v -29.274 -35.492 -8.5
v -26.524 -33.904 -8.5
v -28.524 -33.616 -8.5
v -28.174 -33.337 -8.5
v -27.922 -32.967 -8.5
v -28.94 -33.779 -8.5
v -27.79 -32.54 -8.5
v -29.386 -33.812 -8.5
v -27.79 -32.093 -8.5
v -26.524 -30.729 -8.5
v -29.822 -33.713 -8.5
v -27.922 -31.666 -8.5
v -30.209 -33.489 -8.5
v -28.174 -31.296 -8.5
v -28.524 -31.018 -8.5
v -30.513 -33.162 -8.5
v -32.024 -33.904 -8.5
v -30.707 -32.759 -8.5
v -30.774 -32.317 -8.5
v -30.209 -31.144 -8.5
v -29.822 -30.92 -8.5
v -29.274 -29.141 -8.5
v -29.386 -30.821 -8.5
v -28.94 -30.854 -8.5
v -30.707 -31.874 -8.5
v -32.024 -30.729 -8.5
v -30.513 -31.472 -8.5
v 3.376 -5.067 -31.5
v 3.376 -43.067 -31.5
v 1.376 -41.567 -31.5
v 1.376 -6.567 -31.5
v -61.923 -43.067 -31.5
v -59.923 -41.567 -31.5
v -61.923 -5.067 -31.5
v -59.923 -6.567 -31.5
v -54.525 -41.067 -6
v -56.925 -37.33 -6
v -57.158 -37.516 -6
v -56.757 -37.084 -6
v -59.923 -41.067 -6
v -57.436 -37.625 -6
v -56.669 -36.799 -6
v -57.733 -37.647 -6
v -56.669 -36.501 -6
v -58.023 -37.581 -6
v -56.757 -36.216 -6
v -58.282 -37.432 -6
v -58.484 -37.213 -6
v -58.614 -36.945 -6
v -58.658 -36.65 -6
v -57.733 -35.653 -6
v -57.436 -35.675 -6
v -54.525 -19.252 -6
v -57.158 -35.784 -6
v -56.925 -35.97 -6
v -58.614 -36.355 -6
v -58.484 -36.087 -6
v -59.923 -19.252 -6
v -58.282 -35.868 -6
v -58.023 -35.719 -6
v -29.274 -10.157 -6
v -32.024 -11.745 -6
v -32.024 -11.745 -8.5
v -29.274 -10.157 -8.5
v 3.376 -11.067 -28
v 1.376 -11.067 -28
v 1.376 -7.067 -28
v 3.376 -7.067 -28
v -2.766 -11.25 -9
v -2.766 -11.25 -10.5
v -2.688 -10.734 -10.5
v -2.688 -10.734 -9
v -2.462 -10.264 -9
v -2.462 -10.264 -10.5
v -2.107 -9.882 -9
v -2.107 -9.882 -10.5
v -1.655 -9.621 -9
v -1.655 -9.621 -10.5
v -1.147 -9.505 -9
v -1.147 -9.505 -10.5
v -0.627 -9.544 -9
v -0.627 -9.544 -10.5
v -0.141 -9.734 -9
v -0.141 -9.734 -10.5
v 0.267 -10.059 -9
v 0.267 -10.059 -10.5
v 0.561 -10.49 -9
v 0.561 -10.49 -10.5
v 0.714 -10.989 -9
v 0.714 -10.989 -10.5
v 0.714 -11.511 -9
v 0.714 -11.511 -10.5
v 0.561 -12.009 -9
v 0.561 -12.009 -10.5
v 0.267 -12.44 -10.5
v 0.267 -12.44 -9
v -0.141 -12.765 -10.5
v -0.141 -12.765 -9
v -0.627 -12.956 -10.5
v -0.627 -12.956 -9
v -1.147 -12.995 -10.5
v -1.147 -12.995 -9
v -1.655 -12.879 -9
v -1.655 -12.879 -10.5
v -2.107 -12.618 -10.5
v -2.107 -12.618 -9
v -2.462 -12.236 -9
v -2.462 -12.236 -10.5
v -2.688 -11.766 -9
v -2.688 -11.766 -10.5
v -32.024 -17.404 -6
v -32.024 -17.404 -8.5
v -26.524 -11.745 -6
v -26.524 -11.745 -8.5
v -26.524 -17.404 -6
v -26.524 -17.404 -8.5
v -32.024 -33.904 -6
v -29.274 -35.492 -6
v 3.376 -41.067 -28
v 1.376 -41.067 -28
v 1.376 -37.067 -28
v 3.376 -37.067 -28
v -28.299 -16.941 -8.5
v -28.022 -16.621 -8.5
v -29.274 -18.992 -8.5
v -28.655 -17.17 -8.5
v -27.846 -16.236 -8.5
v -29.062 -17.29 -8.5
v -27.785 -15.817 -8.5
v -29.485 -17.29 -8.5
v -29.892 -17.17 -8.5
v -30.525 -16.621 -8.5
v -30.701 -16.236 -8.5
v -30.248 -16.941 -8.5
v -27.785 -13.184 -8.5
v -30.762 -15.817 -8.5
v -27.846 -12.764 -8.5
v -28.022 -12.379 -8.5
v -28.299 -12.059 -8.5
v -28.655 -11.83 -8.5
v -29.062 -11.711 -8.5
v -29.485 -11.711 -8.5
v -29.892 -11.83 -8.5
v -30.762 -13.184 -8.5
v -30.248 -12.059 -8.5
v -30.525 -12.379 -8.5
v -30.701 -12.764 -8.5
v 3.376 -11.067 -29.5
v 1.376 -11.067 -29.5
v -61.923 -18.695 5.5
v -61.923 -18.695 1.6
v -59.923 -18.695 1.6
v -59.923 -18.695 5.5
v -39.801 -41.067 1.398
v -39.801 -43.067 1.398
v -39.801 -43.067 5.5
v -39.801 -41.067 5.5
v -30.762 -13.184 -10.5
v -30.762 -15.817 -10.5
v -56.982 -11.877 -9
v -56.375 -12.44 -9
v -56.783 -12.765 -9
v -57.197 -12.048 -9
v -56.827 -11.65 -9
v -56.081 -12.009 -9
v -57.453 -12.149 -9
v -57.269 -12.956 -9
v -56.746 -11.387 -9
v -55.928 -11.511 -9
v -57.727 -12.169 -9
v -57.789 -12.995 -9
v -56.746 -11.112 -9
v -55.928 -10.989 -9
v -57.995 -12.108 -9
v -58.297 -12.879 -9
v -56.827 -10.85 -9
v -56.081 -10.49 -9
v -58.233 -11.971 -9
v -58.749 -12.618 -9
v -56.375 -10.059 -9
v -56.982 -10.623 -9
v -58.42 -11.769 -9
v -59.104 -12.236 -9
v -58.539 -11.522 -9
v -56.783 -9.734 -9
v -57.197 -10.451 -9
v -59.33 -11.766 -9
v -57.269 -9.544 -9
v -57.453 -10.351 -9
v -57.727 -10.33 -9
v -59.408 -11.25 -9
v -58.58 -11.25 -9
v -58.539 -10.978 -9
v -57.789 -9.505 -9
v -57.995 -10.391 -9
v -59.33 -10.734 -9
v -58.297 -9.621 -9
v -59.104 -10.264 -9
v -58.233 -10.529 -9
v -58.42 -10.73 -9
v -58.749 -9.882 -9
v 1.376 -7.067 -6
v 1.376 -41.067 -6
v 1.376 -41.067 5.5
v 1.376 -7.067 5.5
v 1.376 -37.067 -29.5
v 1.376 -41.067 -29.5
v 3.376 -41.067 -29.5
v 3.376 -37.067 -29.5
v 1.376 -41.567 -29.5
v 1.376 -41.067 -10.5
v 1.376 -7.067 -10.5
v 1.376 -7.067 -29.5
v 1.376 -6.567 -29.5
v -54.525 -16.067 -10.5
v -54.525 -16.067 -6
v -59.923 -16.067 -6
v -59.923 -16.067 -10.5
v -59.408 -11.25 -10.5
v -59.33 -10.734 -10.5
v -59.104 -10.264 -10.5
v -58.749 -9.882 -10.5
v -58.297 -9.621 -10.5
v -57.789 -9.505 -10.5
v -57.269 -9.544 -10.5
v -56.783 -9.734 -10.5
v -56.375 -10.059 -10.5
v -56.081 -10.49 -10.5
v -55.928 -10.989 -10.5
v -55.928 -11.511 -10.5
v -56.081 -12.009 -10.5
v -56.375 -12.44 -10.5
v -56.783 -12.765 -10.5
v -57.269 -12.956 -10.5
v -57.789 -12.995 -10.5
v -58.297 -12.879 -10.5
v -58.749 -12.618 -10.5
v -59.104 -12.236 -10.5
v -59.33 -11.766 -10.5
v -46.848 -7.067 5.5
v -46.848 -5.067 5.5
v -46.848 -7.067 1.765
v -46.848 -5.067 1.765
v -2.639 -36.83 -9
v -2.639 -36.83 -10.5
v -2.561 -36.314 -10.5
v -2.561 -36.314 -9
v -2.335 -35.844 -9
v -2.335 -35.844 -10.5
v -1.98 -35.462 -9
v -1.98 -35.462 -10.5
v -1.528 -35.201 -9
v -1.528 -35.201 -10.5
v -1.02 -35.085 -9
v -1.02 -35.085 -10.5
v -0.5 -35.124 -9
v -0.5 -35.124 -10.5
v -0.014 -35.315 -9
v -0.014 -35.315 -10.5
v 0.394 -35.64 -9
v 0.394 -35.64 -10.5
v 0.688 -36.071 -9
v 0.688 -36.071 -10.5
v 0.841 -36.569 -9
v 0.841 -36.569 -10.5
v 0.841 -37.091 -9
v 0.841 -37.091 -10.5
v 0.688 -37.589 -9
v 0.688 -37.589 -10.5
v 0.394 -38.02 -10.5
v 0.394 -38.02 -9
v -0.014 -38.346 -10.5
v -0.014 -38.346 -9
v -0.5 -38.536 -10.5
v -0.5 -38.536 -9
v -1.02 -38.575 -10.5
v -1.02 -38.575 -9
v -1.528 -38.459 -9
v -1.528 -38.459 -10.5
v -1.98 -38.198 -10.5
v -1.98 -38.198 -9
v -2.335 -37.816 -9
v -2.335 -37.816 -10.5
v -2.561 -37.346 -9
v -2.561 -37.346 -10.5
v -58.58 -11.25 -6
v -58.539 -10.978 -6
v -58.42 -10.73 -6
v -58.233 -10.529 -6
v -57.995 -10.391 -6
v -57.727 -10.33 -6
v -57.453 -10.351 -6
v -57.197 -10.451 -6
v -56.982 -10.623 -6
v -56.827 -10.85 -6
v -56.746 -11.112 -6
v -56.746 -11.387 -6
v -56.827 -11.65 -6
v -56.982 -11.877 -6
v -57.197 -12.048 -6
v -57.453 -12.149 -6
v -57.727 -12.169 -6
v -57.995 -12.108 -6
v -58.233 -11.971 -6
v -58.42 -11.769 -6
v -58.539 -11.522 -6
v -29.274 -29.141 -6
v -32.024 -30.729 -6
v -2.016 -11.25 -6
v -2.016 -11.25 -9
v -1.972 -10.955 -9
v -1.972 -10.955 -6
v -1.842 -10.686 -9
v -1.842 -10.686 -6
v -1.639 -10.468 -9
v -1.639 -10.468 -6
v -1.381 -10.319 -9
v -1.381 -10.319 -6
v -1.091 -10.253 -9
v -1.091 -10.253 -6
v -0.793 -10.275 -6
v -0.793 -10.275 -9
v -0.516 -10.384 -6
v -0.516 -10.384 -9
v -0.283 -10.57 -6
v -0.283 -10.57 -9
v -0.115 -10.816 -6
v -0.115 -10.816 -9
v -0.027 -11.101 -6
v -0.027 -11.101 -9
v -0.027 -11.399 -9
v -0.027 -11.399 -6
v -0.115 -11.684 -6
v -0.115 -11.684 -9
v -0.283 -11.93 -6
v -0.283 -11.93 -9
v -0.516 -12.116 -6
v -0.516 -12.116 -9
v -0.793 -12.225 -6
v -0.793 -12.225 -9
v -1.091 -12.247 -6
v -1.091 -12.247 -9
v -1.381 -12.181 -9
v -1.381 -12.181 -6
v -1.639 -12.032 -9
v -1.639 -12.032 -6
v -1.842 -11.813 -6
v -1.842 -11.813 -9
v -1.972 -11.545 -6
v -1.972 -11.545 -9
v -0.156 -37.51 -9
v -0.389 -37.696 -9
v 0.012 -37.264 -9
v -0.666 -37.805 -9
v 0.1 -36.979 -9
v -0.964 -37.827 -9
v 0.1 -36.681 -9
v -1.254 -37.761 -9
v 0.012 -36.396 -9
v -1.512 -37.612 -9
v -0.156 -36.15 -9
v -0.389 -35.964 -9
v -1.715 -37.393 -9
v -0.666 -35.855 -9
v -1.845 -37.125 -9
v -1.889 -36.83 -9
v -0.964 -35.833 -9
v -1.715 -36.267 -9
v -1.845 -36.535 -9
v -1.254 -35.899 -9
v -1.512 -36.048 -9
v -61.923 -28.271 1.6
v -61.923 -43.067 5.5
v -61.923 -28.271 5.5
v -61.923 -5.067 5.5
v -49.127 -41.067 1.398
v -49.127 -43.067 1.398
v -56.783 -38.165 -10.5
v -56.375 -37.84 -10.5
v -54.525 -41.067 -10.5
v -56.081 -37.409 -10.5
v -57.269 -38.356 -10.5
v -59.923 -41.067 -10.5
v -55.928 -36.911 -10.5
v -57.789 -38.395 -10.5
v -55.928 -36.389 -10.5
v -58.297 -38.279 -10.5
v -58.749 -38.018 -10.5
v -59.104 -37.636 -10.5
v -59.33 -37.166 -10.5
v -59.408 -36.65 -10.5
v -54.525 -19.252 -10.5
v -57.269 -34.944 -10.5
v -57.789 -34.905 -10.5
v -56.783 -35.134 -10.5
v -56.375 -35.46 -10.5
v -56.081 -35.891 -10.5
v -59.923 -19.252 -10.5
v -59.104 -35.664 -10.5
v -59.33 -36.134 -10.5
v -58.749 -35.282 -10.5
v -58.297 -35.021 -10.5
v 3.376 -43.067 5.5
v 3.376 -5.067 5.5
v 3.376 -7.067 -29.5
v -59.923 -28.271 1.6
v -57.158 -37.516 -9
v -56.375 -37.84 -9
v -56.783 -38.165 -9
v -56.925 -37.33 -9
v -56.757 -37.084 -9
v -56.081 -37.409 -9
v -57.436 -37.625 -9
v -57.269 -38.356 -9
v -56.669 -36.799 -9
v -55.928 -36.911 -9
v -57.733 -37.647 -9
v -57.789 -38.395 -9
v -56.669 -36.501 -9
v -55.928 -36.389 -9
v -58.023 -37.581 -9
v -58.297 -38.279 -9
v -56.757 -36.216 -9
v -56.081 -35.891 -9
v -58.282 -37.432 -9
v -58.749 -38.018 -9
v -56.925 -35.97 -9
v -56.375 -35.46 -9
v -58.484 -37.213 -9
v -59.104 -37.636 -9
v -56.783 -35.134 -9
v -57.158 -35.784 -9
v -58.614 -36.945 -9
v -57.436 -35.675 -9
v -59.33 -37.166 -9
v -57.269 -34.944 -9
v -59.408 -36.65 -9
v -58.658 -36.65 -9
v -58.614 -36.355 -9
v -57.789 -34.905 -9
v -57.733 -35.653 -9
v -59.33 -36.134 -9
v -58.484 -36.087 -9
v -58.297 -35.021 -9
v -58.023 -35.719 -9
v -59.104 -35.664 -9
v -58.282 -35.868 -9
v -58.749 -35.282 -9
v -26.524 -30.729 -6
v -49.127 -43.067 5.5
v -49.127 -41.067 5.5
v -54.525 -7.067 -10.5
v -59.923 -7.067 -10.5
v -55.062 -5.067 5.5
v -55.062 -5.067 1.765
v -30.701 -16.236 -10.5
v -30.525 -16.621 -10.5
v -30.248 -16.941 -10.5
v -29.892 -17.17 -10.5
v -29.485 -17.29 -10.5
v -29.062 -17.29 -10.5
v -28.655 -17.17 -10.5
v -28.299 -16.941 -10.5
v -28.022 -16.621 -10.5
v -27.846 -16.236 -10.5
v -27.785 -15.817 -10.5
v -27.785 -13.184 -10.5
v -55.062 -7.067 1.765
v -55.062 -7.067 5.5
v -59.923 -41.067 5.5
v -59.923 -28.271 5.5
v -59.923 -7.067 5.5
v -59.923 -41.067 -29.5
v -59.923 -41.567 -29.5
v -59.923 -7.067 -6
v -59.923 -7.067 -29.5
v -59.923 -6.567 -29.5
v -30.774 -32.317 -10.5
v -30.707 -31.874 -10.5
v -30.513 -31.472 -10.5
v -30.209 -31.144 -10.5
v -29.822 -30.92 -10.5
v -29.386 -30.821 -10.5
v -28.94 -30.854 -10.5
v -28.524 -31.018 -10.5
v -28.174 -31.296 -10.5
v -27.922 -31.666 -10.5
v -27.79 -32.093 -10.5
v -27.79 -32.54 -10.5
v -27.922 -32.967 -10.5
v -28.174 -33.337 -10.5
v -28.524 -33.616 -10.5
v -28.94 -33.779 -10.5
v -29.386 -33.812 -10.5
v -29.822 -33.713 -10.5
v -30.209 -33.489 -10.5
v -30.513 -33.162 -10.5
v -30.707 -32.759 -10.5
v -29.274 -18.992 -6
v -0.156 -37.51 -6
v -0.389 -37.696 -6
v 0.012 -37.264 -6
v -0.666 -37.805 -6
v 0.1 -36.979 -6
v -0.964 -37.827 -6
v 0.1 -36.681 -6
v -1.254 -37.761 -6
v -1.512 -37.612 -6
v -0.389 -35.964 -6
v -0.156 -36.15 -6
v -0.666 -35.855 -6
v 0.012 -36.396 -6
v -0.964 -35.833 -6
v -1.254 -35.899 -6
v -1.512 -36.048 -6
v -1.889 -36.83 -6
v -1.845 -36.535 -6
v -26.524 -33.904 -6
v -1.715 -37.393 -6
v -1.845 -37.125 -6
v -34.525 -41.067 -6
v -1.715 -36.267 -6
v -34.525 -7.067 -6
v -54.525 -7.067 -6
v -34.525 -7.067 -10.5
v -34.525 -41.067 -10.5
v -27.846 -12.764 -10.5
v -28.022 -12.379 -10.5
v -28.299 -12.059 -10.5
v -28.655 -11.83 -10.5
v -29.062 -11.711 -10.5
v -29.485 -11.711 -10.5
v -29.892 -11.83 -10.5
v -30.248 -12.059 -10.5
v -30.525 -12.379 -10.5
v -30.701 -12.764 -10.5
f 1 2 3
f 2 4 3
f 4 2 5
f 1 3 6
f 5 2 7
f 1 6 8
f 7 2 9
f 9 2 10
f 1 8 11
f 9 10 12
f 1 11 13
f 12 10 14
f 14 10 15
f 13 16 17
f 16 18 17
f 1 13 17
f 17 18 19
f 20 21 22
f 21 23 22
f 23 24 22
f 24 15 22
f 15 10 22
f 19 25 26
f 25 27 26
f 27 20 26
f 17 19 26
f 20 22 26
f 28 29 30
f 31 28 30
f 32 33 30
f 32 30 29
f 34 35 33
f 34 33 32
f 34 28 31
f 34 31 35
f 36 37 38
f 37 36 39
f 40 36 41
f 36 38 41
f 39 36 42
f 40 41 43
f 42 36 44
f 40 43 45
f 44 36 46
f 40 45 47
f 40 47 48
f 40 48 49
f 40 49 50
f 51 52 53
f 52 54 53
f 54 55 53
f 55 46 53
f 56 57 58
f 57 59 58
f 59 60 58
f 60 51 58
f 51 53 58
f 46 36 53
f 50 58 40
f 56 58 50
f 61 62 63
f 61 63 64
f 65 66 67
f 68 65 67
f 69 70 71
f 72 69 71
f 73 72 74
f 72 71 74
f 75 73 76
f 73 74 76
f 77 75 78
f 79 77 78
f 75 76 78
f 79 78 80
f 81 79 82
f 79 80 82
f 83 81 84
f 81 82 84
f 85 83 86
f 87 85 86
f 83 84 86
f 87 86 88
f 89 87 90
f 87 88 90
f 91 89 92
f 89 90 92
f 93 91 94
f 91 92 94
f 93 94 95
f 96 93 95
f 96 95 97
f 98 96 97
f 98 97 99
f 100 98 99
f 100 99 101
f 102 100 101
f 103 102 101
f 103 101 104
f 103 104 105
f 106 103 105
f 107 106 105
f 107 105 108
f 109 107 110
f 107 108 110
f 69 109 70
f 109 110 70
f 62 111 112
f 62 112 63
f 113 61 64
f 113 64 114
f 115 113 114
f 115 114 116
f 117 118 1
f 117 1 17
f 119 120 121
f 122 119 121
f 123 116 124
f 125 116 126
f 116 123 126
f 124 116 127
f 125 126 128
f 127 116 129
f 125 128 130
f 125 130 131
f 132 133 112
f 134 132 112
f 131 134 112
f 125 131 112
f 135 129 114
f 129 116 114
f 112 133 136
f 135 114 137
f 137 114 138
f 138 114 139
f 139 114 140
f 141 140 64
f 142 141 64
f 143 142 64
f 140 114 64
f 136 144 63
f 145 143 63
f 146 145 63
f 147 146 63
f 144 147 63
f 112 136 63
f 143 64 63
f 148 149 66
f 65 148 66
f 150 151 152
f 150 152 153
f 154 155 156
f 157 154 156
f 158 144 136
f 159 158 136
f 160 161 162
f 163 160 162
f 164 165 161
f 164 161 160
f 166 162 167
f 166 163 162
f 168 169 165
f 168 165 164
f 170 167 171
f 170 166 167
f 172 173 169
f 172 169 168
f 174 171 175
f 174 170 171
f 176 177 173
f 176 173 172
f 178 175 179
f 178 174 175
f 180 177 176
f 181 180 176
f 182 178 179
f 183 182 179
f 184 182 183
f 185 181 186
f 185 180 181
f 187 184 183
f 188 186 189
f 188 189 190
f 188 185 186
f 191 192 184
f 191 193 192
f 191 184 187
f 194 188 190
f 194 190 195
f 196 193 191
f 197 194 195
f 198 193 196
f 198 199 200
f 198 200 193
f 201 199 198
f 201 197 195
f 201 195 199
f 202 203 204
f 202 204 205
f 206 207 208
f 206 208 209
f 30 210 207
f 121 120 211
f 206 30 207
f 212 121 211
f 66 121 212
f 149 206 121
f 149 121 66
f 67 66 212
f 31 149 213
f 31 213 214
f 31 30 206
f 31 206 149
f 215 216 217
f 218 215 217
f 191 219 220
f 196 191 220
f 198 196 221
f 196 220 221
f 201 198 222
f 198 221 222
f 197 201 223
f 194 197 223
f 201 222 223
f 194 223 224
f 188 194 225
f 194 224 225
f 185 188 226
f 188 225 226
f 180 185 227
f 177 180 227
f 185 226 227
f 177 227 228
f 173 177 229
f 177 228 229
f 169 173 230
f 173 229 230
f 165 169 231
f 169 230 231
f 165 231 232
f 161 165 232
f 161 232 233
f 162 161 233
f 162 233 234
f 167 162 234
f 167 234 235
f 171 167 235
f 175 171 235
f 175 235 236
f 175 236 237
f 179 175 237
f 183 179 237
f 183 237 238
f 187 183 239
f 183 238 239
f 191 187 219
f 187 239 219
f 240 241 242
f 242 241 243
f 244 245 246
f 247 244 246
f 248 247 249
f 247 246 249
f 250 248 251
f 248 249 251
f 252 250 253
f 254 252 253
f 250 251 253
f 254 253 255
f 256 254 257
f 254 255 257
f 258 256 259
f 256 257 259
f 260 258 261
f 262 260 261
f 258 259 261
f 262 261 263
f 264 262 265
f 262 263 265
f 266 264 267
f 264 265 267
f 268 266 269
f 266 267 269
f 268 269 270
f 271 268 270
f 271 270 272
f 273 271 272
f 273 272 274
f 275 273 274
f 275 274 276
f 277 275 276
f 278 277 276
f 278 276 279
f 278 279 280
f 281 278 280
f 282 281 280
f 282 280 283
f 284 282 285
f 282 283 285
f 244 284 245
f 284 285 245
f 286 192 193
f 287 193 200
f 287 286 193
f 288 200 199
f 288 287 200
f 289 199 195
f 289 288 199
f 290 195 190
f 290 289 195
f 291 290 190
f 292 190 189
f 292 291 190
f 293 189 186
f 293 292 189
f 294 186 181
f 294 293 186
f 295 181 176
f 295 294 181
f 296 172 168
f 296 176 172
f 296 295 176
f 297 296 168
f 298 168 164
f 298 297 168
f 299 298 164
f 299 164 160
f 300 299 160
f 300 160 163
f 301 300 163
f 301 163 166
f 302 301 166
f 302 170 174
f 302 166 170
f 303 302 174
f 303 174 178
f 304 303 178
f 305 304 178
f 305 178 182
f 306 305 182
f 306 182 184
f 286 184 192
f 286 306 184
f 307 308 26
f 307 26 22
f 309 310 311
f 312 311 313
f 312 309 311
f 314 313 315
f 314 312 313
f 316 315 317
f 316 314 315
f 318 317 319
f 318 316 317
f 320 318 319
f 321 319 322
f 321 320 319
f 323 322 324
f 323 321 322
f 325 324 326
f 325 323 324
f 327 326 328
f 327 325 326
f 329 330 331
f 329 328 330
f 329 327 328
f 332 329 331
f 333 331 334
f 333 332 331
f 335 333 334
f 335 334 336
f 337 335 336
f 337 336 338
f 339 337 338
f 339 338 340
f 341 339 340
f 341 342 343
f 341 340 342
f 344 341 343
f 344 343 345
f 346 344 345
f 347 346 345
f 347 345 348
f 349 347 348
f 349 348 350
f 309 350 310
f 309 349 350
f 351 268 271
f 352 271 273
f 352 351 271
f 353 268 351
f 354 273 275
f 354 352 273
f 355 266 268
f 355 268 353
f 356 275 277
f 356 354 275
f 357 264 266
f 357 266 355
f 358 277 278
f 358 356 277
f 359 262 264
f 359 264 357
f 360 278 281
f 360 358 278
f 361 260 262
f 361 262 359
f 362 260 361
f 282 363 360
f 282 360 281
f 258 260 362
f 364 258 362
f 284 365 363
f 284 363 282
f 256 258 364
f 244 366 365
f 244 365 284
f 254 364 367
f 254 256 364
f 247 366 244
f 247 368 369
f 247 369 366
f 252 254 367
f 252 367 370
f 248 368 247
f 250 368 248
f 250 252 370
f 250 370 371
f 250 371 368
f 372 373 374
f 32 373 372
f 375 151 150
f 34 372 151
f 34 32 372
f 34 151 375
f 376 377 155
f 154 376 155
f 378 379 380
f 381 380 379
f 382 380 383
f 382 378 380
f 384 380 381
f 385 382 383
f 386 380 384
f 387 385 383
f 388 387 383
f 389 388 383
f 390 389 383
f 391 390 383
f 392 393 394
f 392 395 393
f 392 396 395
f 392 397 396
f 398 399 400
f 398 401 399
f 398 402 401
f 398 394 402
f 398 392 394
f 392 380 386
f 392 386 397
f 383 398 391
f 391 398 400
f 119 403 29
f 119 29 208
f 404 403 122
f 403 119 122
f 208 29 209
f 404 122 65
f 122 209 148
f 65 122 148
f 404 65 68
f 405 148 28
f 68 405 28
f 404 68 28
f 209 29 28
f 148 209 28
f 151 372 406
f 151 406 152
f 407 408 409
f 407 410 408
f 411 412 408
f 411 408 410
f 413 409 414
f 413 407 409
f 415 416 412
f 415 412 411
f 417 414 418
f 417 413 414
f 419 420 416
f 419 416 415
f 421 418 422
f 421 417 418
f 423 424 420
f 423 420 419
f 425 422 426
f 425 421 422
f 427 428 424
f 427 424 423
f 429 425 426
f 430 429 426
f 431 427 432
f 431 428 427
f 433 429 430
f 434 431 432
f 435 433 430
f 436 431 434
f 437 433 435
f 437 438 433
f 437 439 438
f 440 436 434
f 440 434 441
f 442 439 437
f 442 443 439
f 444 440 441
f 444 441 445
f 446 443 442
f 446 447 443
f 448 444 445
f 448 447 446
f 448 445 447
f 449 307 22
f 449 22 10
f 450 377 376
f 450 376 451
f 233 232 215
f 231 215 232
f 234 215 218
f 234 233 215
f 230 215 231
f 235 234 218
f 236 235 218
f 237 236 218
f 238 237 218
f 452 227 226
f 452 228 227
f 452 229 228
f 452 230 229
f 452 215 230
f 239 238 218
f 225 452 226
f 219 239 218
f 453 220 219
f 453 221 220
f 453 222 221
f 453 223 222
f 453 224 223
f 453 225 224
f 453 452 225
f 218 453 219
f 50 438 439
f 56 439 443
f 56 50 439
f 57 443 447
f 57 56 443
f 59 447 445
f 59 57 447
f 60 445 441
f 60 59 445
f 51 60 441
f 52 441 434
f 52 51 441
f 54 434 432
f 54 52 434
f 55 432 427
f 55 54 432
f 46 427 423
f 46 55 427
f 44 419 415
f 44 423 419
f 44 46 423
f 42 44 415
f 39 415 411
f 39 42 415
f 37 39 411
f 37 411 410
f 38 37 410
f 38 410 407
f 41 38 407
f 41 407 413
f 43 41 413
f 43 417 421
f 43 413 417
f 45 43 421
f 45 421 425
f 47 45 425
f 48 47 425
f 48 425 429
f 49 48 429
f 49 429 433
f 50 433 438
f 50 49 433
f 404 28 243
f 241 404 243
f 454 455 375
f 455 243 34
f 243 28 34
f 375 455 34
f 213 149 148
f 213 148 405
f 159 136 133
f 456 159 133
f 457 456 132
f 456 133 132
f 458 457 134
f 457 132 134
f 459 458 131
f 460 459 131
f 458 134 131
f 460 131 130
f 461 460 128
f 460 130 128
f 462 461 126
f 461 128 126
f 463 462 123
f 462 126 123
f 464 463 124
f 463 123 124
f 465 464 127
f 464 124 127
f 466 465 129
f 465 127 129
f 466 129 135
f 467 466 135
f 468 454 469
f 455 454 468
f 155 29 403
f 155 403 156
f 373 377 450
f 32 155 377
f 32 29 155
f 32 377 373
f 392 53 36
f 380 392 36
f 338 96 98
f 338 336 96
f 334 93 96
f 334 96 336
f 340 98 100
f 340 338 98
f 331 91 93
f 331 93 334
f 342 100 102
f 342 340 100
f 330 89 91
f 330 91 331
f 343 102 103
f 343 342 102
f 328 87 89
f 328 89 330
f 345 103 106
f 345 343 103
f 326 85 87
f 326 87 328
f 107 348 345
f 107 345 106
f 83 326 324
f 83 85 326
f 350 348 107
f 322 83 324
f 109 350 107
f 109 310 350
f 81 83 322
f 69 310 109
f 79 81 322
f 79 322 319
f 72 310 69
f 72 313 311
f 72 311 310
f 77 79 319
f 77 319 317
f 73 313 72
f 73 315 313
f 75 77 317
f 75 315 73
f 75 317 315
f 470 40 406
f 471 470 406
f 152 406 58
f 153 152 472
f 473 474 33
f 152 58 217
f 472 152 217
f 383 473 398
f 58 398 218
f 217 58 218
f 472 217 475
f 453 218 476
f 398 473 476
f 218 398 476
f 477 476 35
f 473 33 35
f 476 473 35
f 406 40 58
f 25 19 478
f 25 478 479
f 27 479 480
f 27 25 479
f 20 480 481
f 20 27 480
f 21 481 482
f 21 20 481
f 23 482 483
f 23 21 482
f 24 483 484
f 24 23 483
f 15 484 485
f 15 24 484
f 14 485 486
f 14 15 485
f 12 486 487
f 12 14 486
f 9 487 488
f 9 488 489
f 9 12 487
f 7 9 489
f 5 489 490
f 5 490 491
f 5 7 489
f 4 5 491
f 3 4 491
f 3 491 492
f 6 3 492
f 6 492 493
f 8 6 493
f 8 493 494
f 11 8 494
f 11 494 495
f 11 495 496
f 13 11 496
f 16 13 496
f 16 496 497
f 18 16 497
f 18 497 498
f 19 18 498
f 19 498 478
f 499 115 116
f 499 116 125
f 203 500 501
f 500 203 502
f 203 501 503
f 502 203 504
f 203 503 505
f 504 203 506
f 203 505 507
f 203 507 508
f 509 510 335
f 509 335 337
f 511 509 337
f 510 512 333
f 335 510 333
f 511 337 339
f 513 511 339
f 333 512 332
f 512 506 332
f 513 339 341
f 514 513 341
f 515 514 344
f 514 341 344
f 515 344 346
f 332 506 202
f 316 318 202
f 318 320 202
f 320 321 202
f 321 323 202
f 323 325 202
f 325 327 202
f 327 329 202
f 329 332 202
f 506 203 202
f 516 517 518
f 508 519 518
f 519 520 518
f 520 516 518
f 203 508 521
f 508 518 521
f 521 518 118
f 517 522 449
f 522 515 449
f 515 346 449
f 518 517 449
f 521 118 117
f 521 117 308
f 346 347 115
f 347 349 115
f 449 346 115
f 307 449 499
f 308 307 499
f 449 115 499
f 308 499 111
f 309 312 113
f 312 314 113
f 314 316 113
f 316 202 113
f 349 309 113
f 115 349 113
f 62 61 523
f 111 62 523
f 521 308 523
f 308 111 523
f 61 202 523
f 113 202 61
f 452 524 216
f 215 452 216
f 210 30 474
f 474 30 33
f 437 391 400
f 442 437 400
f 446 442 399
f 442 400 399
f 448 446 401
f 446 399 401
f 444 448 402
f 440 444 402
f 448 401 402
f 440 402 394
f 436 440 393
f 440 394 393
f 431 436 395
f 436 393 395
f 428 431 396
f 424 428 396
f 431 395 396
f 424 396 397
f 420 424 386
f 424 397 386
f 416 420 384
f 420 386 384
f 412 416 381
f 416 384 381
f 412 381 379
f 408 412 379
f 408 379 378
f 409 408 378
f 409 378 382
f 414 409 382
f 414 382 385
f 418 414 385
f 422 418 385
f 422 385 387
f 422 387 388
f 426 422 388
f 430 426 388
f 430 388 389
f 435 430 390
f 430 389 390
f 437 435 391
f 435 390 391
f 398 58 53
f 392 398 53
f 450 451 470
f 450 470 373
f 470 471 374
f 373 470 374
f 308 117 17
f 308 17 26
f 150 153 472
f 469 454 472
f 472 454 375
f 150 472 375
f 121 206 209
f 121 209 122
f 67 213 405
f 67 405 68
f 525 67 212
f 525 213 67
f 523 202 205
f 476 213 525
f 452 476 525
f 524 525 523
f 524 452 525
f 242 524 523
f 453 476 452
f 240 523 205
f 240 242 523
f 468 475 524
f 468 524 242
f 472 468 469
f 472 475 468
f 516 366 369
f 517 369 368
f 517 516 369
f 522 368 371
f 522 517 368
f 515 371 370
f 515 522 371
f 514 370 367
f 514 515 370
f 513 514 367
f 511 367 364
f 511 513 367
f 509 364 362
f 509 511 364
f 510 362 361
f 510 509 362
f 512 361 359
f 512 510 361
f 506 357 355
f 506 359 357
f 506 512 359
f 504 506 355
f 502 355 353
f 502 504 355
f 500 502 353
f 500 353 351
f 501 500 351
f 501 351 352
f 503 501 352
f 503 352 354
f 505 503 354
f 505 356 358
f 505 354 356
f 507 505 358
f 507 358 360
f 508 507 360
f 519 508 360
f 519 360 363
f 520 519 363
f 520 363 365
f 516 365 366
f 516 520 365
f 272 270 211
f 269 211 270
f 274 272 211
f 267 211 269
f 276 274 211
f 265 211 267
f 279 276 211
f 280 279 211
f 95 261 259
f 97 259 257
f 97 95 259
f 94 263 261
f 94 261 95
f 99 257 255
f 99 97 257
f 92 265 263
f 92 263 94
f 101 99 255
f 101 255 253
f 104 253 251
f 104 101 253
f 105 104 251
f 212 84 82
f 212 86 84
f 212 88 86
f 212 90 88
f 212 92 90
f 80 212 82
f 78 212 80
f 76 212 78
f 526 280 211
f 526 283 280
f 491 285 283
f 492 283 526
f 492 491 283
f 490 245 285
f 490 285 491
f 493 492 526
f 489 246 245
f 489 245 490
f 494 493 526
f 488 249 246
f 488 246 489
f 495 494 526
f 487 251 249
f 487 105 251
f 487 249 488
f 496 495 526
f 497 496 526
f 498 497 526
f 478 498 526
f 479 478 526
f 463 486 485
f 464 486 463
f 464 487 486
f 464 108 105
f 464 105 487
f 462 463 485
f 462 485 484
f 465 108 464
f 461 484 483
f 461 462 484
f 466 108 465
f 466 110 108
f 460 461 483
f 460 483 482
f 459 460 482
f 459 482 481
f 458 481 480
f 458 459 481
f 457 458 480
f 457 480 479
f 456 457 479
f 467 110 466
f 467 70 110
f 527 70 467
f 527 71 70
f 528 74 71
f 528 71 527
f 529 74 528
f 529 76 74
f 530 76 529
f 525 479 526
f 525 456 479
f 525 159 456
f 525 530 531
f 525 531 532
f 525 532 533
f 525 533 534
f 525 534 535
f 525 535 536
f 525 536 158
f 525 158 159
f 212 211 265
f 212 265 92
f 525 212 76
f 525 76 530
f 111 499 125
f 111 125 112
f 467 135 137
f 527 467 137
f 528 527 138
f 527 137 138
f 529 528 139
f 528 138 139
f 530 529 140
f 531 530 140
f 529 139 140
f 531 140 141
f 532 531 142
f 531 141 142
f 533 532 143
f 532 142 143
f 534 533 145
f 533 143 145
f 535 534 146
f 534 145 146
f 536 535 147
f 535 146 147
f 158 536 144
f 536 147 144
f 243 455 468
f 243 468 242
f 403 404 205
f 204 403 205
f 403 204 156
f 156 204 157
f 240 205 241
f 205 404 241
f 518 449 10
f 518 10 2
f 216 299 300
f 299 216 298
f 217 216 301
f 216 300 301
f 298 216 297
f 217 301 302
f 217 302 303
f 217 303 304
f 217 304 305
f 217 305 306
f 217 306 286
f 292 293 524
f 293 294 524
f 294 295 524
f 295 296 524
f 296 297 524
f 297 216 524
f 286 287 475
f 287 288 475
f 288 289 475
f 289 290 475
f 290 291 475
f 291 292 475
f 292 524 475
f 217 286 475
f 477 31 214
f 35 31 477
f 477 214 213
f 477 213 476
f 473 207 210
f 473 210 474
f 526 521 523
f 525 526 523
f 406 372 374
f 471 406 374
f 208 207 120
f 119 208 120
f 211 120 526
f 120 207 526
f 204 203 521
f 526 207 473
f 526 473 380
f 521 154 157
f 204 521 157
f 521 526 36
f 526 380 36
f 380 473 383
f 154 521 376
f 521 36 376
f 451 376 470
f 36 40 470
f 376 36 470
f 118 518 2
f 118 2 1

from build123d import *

# Parameters (mm, degrees)
SKETCH_2_W           = 65.2997206
SKETCH_2_H           = 38
SKETCH_2_R           = 1.00000254
SKETCH_2_R_2         = 0.922218434
SKETCH_2_R_3         = 1.5
EXTRUDE_2_DEPTH      = 4.5
SKETCH_3_R           = 1.5
CUT_EXTRUDE_2_DEPTH  = 2.5
SKETCH_5_W           = 65.2997206
SKETCH_5_H           = 38
SKETCH_5_W_2         = 61.2997206
SKETCH_5_H_2         = 34
EXTRUDE_3_DEPTH      = 21
EXTRUDE_3_DEPTH_BACK = 16
SKETCH_7_W           = 8.214112973
SKETCH_7_H           = 3.795011114
CUT_EXTRUDE_4_DEPTH  = 3
SKETCH_8_W           = 4
SKETCH_8_H           = 9.575559499
CUT_EXTRUDE_5_DEPTH  = 3
SKETCH_9_W           = 9.326303795
SKETCH_9_H           = 4.202278939
CUT_EXTRUDE_6_DEPTH  = 3
CUT_EXTRUDE_7_DEPTH  = 10
SKETCH_15_R          = 1.75
CUT_EXTRUDE_8_DEPTH  = 1.5
SKETCH_18_W          = 61.2997206
SKETCH_18_H          = 35
CUT_EXTRUDE_9_DEPTH  = 2
SKETCH_19_W          = 1.5
SKETCH_19_H          = 4
CUT_EXTRUDE_10_DEPTH = 2


with BuildPart() as part:
    # 草图2 → 凸台-拉伸2 (new body)
    with BuildSketch(Plane(origin=(0, 0, -6), x_dir=(-1, 0, 0), z_dir=(0, 0, -1))):
        with Locations((29.273558547, -24.066548133)):
            Rectangle(SKETCH_2_W, SKETCH_2_H)
        with Locations((1.016002032, -11.24978156)):
            Circle(SKETCH_2_R, mode=Mode.SUBTRACT)
        with Locations((0.889001778, -36.83007366)):
            Circle(SKETCH_2_R, mode=Mode.SUBTRACT)
        with Locations((57.658115316, -36.64983236)):
            Circle(SKETCH_2_R, mode=Mode.SUBTRACT)
        with Locations((57.658115316, -11.24978156)):
            Circle(SKETCH_2_R_2, mode=Mode.SUBTRACT)
        with Locations((29.273558547, -32.316548133)):
            Circle(SKETCH_2_R_3, mode=Mode.SUBTRACT)
        with BuildLine():
            Line((27.785407033, -15.816548133), (27.785407033, -13.183619987))
            ThreePointArc((27.785407033, -13.183619987), (29.273558547, -11.695468472), (30.761710061, -13.183619987))
            Line((30.761710061, -13.183619987), (30.761710061, -15.816548133))
            ThreePointArc((30.761710061, -15.816548133), (29.273558547, -17.304699647), (27.785407033, -15.816548133))
        make_face(mode=Mode.SUBTRACT)
    extrude(amount=EXTRUDE_2_DEPTH)

    # 草图3 → 切除-拉伸2 (cut)
    with BuildSketch(Plane(origin=(0, 0, -6), x_dir=(-1, 0, 0), z_dir=(0, 0, -1))):
        Polygon((29.273558547, -18.991974614), (32.023558547, -17.404261373), (32.023558547, -14.920341582), (32.023558547, -14.228834893), (32.023558547, -11.744915102), (29.273558547, -10.157201862), (26.523558547, -11.744915102), (26.523558547, -14.228834893), (26.523558547, -14.920341582), (26.523558547, -17.404261373), align=None)
        with BuildLine():
            ThreePointArc((30.761710061, -15.816548133), (29.273558547, -17.304699647), (27.785407033, -15.816548133))
            Line((27.785407033, -15.816548133), (27.785407033, -13.183619987))
            ThreePointArc((27.785407033, -13.183619987), (29.273558547, -11.695468472), (30.761710061, -13.183619987))
            Line((30.761710061, -13.183619987), (30.761710061, -15.816548133))
        make_face(mode=Mode.SUBTRACT)
        Polygon((26.523558547, -30.728834893), (26.523558547, -33.904261373), (29.273558547, -35.491974614), (32.023558547, -33.904261373), (32.023558547, -30.728834893), (29.273558547, -29.141121653), align=None)
        with Locations((29.273558547, -32.316548133)):
            Circle(SKETCH_3_R, mode=Mode.SUBTRACT)
    extrude(amount=CUT_EXTRUDE_2_DEPTH, mode=Mode.SUBTRACT)

    # 草图5 → 凸台-拉伸3 (add, two sides)
    with BuildSketch(Plane(origin=(0, 0, -10.5), x_dir=(-1, 0, 0), z_dir=(0, 0, -1))) as extrude_3_sk:
        with Locations((29.273558547, -24.066548133)):
            Rectangle(SKETCH_5_W, SKETCH_5_H)
        with Locations((29.273558547, -24.066548133)):
            Rectangle(SKETCH_5_W_2, SKETCH_5_H_2, mode=Mode.SUBTRACT)
    extrude(amount=EXTRUDE_3_DEPTH)
    extrude(extrude_3_sk.sketch, amount=-EXTRUDE_3_DEPTH_BACK)

    # 草图7 → 切除-拉伸4 (cut)
    with BuildSketch(Plane(origin=(0, -5.066548133, 0), x_dir=(1, 0, 0), z_dir=(0, 1, 0))):
        with Locations((-50.955145133, -3.662545243)):
            Rectangle(SKETCH_7_W, SKETCH_7_H)
    extrude(amount=-CUT_EXTRUDE_4_DEPTH, mode=Mode.SUBTRACT)

    # 草图8 → 切除-拉伸5 (cut)
    with BuildSketch(Plane.ZY.offset(61.923418847)):
        with Locations((3.6000508, -23.483057223)):
            Rectangle(SKETCH_8_W, SKETCH_8_H)
    extrude(amount=-CUT_EXTRUDE_5_DEPTH, mode=Mode.SUBTRACT)

    # 草图9 → 切除-拉伸6 (cut)
    with BuildSketch(Plane.XZ.offset(43.066548133)):
        with Locations((-44.464129124, 3.49891133)):
            Rectangle(SKETCH_9_W, SKETCH_9_H)
    extrude(amount=-CUT_EXTRUDE_6_DEPTH, mode=Mode.SUBTRACT)

    # 草图13 → 切除-拉伸7 (cut)
    with BuildSketch(Plane.XY.offset(-6)):
        Polygon((-59.923418847, -16.066514367), (-59.923418847, -19.252115931), (-54.525349934, -19.252115931), (-54.525349934, -41.066548133), (-34.525349934, -41.066548133), (-34.525349934, -7.066548133), (-54.525349934, -7.066548133), (-54.525349934, -12.880912803), (-54.525349934, -16.066514367), align=None)
    extrude(amount=-CUT_EXTRUDE_7_DEPTH, mode=Mode.SUBTRACT)

    # 草图15 → 切除-拉伸8 (cut)
    with BuildSketch(Plane(origin=(0, 0, -10.5), x_dir=(-1, 0, 0), z_dir=(0, 0, -1))):
        with Locations((1.016002032, -11.24978156)):
            Circle(SKETCH_15_R)
        with Locations((57.658115316, -11.24978156)):
            Circle(SKETCH_15_R)
        with Locations((0.889001778, -36.83007366)):
            Circle(SKETCH_15_R)
        with Locations((57.658115316, -36.64983236)):
            Circle(SKETCH_15_R)
    extrude(amount=-CUT_EXTRUDE_8_DEPTH, mode=Mode.SUBTRACT)

    # 草图18 → 切除-拉伸9 (cut)
    with BuildSketch(Plane(origin=(0, 0, -31.5), x_dir=(-1, 0, 0), z_dir=(0, 0, -1))):
        with Locations((29.273558547, -24.066548133)):
            Rectangle(SKETCH_18_W, SKETCH_18_H)
    extrude(amount=-CUT_EXTRUDE_9_DEPTH, mode=Mode.SUBTRACT)

    # 草图19 → 切除-拉伸10 (cut)
    with BuildSketch(Plane.ZY.offset(-1.376301753)):
        with Locations((-28.75, -9.066548133)):
            Rectangle(SKETCH_19_W, SKETCH_19_H)
        with Locations((-28.75, -39.066548133)):
            Rectangle(SKETCH_19_W, SKETCH_19_H)
    extrude(amount=-CUT_EXTRUDE_10_DEPTH, mode=Mode.SUBTRACT)


solid = part.part
